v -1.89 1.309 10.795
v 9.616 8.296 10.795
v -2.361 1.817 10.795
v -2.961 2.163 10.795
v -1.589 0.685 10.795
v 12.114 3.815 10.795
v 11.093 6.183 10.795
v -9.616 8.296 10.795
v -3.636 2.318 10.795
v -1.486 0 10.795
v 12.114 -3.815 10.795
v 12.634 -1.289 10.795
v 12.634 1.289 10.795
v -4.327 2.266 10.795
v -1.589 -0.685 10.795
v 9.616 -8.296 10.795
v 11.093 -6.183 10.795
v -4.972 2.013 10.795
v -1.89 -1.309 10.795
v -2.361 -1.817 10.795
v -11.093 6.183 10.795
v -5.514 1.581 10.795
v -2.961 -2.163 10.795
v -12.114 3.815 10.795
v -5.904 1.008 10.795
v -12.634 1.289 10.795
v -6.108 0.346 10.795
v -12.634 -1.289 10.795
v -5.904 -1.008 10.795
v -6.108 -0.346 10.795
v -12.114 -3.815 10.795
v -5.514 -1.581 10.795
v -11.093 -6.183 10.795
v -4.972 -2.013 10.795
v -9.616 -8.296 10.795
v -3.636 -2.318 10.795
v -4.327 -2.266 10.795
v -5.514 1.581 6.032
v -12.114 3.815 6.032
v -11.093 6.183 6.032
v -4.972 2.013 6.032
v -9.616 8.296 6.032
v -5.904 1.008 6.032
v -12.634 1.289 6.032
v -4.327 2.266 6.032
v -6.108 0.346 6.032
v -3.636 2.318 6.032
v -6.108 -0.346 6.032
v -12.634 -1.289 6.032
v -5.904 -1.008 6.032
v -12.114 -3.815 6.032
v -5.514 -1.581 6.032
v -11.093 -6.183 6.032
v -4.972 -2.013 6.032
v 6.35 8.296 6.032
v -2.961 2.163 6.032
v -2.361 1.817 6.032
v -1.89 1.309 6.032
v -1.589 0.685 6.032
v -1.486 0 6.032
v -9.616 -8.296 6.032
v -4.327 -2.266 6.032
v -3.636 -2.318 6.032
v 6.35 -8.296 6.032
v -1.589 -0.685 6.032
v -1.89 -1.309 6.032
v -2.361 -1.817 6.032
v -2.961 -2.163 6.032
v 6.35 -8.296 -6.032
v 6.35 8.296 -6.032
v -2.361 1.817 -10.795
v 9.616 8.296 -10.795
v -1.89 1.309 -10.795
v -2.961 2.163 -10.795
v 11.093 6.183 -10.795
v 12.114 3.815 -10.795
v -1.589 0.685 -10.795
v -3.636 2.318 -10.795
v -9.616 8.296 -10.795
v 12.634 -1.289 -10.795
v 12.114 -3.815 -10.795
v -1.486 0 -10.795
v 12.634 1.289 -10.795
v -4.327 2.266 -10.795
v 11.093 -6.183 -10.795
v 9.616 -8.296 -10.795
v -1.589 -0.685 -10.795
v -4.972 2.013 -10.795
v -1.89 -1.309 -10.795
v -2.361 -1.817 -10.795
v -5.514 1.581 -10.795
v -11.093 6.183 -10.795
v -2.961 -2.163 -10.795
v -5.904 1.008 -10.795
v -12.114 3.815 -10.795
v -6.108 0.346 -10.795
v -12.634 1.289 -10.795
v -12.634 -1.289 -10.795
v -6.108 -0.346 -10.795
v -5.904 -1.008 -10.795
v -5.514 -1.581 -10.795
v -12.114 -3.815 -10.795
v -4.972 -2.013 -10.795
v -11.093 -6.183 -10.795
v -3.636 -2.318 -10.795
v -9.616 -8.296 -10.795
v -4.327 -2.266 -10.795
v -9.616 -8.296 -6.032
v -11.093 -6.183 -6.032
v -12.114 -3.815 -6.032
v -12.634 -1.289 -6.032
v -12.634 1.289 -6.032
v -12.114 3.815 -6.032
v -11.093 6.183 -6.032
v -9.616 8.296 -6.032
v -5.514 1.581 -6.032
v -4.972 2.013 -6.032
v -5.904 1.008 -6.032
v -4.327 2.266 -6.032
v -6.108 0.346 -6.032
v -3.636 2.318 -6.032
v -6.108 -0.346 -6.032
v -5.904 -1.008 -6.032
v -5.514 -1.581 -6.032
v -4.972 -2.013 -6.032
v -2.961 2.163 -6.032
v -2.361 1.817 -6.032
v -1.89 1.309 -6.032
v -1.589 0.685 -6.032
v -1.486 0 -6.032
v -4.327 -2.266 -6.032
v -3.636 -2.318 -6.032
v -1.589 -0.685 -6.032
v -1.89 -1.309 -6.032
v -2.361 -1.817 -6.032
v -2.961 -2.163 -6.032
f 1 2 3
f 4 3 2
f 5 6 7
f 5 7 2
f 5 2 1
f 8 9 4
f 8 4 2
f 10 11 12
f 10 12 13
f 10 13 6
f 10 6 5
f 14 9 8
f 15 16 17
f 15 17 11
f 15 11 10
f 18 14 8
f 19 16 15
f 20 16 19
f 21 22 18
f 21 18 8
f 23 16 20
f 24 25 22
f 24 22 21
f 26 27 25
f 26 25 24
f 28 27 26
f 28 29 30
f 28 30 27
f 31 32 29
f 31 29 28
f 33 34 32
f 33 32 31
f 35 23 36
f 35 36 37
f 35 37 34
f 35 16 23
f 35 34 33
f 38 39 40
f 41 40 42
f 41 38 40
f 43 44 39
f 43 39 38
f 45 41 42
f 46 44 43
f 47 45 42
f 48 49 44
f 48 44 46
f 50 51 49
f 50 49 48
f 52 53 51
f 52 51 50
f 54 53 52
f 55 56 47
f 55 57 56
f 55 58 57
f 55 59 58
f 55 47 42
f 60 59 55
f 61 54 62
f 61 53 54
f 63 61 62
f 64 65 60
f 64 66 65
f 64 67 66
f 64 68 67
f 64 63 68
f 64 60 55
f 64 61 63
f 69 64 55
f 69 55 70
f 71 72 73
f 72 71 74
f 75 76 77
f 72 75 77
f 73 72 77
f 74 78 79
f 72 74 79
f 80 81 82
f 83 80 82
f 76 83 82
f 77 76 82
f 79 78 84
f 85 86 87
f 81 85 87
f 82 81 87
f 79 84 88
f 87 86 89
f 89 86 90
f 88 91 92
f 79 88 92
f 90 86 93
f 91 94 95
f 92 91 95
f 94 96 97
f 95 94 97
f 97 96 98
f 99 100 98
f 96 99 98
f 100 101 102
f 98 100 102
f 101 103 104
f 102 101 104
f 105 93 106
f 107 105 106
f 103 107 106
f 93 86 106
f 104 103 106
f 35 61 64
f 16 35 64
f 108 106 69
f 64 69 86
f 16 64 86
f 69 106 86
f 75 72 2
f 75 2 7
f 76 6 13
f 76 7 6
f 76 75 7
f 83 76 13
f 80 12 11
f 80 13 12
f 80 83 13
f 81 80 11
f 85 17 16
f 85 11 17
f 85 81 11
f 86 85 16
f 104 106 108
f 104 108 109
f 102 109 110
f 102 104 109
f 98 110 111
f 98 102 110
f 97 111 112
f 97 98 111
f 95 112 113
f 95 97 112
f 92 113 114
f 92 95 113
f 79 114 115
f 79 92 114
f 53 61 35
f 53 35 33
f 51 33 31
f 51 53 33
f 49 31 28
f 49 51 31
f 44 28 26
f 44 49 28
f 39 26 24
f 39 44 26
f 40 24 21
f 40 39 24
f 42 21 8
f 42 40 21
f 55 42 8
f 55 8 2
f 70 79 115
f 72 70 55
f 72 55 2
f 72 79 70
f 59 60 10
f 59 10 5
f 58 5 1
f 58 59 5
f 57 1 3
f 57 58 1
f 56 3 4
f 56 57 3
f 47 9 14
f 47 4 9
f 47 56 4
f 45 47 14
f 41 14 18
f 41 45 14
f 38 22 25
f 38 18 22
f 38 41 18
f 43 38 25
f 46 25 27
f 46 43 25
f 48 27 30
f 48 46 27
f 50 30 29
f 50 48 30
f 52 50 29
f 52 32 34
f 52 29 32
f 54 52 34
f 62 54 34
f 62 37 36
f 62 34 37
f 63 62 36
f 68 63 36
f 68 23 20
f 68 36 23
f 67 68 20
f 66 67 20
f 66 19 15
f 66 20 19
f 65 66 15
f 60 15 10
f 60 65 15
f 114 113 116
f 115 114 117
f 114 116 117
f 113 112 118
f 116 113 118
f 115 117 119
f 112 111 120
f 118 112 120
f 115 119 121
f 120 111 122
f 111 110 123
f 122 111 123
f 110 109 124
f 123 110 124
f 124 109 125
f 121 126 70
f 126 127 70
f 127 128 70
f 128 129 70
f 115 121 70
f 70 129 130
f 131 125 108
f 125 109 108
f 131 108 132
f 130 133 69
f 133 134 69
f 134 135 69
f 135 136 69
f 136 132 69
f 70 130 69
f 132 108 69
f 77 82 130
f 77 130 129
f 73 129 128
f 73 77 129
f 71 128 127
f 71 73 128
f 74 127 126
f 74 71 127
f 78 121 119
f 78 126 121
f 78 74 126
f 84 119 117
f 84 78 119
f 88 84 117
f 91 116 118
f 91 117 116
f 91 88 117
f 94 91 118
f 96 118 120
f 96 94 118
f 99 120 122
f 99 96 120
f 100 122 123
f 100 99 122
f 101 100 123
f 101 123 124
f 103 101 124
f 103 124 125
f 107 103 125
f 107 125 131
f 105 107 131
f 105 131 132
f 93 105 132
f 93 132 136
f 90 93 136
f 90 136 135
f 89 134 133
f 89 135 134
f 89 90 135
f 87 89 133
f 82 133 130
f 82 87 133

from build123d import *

# Parameters (mm, degrees)
SKETCH1_W               = 12.7
SKETCH1_H               = 21.59
CUT_EXTRUDE1_DEPTH      = 21.955
CUT_EXTRUDE1_DEPTH_BACK = 21.955
SKETCH3_W               = 19.05
SKETCH3_H               = 12.065
CUT_EXTRUDE2_DEPTH      = 21.955
CUT_EXTRUDE2_DEPTH_BACK = 21.955
SKETCH4_W               = 19.231618108
SKETCH4_H               = 5.318049176
CUT_EXTRUDE3_DEPTH      = 27.386441902
CUT_EXTRUDE3_DEPTH_BACK = 27.386441902
SKETCH5_R               = 2.3241


with BuildPart() as part:
    # Sketch1 → Revolve1 (revolve)
    with BuildSketch(Plane(origin=(0, 0, 0), x_dir=(1, 0, 0), z_dir=(0, 1, 0))):
        with Locations((6.35, 0)):
            Rectangle(SKETCH1_W, SKETCH1_H)
    revolve(axis=Axis((0, 0, 10.795), (0, 0, -1)))

    # Sketch3 → Cut-Extrude1 (cut, two sides: drawn at the far end of the back side and taken through both)
    with BuildSketch(Plane(origin=(0, 0, 0), x_dir=(1, 0, 0), z_dir=(0, 1, 0)).offset(-CUT_EXTRUDE1_DEPTH_BACK)):
        with Locations((-3.175, 0)):
            Rectangle(SKETCH3_W, SKETCH3_H)
    extrude(amount=CUT_EXTRUDE1_DEPTH + CUT_EXTRUDE1_DEPTH_BACK, mode=Mode.SUBTRACT)

    # Sketch4 → Cut-Extrude2 (cut, two sides: drawn at the far end of the back side and taken through both)
    with BuildSketch(Plane.XY.offset(-CUT_EXTRUDE2_DEPTH_BACK)):
        Polygon((-9.615809054, 8.296156715), (9.615809054, 8.296156715), (9.615809054, 14.116385036), (-9.615809054, 13.939663028), align=None)
        with Locations((0, -10.955181303)):
            Rectangle(SKETCH4_W, SKETCH4_H)
    extrude(amount=CUT_EXTRUDE2_DEPTH + CUT_EXTRUDE2_DEPTH_BACK, mode=Mode.SUBTRACT)

    # Sketch5 → Cut-Extrude3 (cut, two sides: drawn at the far end of the back side and taken through both)
    with BuildSketch(Plane.XY.offset(10.795).offset(-CUT_EXTRUDE3_DEPTH_BACK)):
        with Locations((-3.81, 0)):
            Circle(SKETCH5_R)
    extrude(amount=CUT_EXTRUDE3_DEPTH + CUT_EXTRUDE3_DEPTH_BACK, mode=Mode.SUBTRACT)


solid = part.part
